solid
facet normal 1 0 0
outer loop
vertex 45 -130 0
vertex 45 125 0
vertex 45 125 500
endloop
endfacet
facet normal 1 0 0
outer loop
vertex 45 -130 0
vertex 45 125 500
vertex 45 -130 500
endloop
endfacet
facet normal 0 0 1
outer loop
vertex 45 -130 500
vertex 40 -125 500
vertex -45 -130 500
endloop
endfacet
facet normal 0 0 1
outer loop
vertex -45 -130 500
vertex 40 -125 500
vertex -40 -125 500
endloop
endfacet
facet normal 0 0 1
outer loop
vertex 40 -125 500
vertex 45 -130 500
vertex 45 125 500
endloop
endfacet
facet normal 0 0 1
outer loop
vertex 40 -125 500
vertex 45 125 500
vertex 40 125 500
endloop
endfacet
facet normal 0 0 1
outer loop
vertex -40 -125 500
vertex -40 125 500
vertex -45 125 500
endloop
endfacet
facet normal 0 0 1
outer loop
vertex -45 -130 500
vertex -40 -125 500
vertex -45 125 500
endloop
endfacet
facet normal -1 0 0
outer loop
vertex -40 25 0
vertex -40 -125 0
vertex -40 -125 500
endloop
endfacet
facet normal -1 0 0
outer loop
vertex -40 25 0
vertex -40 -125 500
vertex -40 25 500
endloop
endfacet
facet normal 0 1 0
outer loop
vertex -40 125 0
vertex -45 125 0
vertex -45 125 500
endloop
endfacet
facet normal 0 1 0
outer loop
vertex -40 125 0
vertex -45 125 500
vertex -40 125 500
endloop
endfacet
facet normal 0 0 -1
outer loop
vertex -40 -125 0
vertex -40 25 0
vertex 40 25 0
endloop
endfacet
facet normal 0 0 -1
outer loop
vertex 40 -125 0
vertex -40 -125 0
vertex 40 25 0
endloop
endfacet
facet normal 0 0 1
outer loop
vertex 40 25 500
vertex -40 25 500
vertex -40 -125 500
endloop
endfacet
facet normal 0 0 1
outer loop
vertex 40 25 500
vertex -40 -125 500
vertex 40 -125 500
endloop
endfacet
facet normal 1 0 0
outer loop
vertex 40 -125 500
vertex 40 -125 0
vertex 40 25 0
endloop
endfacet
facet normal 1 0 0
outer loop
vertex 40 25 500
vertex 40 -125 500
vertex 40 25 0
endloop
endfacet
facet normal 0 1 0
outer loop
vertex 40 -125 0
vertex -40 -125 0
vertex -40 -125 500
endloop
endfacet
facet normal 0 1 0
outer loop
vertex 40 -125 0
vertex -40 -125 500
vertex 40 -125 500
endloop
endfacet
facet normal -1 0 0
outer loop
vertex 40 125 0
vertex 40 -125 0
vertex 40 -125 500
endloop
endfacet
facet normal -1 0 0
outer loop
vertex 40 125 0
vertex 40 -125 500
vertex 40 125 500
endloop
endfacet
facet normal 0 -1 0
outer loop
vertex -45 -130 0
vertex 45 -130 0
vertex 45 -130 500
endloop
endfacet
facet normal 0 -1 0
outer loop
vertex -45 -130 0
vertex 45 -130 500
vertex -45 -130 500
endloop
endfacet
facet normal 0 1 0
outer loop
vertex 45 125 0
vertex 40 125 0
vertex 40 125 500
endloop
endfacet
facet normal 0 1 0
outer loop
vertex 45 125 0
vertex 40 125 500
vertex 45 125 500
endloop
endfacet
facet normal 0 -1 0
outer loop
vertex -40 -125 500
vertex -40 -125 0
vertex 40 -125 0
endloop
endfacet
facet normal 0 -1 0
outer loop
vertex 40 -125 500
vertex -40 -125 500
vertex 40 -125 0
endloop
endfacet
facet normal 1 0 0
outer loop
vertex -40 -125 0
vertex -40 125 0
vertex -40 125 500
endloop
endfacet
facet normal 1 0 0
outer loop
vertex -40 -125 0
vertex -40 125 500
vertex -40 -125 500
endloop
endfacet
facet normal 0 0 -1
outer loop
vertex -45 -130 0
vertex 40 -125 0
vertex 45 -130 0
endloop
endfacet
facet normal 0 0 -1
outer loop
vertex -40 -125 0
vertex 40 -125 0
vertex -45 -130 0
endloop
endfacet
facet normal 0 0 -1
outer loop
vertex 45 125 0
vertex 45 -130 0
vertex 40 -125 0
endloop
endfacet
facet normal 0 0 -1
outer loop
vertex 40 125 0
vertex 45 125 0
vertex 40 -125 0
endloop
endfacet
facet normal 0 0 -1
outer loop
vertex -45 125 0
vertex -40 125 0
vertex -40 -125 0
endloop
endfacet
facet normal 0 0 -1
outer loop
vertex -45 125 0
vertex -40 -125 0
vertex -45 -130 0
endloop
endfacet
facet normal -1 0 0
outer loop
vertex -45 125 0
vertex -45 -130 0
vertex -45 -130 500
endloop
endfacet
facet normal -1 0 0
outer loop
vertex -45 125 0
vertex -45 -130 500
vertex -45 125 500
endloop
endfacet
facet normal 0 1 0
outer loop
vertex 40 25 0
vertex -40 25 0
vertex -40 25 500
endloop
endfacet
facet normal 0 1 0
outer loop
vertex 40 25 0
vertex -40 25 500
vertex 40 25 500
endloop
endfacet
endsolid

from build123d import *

# Parameters (mm, degrees)
BOSS_EXTRUDE1_DEPTH = 500
SKETCH1_4_W         = 80
SKETCH1_4_H         = 150
BOSS_EXTRUDE3_DEPTH = 500


with BuildPart() as part:
    # Sketch1 → Boss-Extrude1 (new body)
    with BuildSketch(Plane.XY):
        Polygon((45, 125), (45, -130), (-45, -130), (-45, 125), (-40, 125), (-40, -125), (40, -125), (40, 125), align=None)
    extrude(amount=BOSS_EXTRUDE1_DEPTH)


with BuildPart() as body_2:
    # Sketch1<4> → Boss-Extrude3 (new body)
    with BuildSketch(Plane.XY):
        with Locations((0, -50)):
            Rectangle(SKETCH1_4_W, SKETCH1_4_H)
    extrude(amount=BOSS_EXTRUDE3_DEPTH)


solid = Compound([part.part, body_2.part])
